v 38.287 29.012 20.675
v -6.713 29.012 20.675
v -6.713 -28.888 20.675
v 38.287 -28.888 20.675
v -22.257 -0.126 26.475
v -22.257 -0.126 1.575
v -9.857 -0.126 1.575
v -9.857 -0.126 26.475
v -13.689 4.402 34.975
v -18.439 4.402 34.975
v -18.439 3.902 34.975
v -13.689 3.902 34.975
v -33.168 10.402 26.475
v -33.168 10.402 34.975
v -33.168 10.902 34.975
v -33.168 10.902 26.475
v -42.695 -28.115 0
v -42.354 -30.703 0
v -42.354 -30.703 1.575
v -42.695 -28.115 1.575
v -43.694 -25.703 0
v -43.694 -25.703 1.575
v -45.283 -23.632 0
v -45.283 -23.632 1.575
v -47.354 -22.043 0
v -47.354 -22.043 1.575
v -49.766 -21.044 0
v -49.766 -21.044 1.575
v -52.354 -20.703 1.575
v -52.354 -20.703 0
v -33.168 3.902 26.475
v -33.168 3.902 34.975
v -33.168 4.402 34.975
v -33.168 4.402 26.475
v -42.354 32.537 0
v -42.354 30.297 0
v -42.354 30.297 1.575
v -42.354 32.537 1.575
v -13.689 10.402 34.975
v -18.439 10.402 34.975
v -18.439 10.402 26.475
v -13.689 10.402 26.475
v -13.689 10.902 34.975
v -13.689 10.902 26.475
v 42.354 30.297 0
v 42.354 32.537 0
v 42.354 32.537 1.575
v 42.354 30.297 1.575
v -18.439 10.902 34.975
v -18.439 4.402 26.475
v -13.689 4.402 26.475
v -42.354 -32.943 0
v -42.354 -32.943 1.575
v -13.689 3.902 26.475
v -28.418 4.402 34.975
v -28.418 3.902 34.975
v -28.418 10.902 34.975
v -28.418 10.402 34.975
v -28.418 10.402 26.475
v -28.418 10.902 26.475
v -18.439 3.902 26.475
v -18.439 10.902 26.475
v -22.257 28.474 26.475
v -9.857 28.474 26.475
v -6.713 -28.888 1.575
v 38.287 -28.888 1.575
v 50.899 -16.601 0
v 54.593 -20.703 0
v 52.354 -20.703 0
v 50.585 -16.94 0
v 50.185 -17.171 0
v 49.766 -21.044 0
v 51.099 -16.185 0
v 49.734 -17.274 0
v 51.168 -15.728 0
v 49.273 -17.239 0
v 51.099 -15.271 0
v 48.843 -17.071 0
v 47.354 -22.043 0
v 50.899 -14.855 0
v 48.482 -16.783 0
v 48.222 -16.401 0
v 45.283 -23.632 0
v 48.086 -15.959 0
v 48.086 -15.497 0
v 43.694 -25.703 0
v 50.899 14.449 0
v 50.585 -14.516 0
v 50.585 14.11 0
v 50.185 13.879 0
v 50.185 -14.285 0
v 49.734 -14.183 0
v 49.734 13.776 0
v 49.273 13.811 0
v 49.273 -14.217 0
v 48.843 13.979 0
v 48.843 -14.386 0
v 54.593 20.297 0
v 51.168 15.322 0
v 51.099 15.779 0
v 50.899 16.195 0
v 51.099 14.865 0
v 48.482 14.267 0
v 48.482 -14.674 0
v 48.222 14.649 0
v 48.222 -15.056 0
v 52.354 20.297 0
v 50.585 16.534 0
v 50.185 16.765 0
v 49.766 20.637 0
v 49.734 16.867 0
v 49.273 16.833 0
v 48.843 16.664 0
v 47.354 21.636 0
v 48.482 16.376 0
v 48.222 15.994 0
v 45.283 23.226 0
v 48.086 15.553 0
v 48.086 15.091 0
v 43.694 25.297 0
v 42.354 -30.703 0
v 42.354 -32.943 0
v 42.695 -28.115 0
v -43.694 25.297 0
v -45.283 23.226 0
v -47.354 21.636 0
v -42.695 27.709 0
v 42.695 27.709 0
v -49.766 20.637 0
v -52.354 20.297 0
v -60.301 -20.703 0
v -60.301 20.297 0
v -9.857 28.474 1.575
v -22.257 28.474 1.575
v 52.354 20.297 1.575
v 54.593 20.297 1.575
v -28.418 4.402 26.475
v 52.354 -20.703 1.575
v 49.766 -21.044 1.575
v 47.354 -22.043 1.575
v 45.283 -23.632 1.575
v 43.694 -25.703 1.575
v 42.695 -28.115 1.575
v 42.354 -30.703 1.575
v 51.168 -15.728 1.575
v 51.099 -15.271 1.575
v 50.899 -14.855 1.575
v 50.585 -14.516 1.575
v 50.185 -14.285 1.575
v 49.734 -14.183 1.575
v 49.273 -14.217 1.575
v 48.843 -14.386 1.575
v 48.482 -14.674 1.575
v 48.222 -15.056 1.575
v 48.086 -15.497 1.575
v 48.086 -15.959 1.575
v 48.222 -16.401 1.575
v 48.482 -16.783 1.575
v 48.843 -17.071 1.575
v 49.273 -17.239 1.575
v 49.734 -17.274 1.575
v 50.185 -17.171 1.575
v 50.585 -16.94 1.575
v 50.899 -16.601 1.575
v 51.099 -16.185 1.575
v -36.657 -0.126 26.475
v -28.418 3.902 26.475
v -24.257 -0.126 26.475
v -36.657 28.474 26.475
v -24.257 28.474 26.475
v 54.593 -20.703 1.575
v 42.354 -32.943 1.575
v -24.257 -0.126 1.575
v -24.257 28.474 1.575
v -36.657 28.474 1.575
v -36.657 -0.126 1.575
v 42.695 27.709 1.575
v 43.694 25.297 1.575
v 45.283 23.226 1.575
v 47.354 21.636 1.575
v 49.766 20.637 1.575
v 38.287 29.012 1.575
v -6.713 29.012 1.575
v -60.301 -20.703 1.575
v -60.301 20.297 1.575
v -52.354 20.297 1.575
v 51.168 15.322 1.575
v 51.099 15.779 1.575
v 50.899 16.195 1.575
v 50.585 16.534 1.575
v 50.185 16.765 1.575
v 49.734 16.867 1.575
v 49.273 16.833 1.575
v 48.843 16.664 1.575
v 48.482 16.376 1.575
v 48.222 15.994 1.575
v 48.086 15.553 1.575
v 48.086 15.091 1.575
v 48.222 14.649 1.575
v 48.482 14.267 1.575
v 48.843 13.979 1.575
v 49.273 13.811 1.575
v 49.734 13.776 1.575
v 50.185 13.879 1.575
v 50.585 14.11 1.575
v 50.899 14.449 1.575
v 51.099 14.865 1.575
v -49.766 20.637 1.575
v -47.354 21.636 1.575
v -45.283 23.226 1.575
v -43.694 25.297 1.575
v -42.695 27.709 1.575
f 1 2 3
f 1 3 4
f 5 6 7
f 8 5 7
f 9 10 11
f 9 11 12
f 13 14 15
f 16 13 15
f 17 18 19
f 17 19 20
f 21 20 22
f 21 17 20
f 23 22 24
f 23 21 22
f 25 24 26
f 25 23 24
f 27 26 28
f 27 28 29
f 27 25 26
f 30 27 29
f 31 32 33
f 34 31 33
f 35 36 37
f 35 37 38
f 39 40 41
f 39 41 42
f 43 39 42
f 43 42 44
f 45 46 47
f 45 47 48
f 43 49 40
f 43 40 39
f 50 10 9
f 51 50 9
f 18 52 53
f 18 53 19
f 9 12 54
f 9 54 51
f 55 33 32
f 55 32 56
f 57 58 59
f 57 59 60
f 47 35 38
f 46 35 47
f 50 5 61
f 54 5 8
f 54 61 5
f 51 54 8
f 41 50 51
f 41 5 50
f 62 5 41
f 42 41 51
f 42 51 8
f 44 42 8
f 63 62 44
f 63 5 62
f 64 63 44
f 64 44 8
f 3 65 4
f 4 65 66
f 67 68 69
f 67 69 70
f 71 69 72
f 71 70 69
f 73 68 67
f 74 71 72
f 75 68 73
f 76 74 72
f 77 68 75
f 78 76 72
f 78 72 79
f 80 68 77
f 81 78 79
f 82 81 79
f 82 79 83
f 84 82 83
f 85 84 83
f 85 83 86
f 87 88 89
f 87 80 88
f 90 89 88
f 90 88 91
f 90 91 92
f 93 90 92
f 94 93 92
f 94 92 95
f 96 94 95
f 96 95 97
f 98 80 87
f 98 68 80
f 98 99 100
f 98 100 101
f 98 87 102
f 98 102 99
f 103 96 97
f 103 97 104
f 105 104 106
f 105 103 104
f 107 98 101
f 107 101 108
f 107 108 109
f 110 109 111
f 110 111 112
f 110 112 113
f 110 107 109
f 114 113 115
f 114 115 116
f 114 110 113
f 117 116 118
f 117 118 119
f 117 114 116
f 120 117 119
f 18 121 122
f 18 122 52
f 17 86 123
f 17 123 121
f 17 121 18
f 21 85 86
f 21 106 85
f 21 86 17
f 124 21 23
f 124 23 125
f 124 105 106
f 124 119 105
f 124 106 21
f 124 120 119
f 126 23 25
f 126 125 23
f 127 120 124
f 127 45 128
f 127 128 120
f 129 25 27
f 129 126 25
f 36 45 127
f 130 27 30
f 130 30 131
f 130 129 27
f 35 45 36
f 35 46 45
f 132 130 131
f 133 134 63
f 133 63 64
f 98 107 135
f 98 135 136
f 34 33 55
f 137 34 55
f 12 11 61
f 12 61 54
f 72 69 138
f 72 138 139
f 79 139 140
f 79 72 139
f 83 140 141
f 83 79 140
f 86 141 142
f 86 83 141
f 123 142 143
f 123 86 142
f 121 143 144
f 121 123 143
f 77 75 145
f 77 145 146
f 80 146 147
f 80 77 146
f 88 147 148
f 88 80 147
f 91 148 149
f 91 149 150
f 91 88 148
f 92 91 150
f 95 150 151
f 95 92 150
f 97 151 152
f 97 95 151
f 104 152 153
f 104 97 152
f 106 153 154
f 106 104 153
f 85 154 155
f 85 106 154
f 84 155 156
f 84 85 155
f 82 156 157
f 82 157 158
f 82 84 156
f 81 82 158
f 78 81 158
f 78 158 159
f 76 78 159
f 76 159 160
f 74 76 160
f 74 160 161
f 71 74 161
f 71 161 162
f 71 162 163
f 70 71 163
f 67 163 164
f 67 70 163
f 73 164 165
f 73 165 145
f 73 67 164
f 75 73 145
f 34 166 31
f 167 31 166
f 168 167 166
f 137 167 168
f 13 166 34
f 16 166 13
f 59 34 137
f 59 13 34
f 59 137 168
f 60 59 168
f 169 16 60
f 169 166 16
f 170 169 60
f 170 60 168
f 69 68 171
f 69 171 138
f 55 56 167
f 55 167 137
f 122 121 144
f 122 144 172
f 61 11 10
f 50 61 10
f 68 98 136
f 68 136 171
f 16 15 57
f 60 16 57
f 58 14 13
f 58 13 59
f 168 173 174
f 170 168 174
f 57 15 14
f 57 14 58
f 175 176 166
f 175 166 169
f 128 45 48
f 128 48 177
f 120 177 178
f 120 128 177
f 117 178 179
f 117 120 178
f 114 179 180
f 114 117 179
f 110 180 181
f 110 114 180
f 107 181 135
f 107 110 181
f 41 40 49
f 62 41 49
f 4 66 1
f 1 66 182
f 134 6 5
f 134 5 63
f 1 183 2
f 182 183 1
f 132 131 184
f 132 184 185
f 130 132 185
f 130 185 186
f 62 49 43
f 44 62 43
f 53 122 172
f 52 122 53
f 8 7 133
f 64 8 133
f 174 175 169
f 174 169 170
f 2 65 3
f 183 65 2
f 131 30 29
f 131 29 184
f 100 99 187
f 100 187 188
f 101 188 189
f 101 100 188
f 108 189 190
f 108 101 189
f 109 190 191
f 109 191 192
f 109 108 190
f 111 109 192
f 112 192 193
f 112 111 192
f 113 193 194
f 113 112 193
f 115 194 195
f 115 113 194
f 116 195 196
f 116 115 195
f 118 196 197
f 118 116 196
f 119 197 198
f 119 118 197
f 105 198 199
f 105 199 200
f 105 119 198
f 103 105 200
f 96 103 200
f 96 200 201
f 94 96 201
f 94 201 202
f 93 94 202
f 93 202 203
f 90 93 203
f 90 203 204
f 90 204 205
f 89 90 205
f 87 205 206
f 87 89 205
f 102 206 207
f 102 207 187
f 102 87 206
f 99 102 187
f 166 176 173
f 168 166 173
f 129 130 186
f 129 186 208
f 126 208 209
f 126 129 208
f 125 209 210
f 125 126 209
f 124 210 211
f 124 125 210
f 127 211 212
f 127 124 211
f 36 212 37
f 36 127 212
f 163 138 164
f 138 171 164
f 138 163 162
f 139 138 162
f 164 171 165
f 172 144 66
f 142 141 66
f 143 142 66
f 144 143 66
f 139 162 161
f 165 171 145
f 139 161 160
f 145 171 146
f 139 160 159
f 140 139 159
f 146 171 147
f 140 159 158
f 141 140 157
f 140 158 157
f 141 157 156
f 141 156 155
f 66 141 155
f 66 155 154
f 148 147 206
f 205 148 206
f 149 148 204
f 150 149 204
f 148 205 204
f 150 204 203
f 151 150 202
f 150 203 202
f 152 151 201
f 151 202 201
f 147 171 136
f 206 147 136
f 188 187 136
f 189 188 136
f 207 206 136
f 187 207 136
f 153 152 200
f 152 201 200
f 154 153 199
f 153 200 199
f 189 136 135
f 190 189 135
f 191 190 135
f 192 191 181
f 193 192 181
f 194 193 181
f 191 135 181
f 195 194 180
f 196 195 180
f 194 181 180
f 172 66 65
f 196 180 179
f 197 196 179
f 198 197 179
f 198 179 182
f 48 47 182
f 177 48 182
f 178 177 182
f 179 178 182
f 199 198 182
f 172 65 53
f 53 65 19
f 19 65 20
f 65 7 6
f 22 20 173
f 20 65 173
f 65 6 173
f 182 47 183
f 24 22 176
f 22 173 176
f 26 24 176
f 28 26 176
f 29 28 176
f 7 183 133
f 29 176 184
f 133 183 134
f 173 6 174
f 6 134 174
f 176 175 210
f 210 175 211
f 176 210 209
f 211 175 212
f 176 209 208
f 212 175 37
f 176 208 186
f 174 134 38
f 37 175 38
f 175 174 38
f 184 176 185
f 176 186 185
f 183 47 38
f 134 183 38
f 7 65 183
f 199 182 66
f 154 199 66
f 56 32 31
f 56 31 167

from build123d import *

# Parameters (mm, degrees)
SKETCH1_R           = 1.55
BOSS_EXTRUDE1_DEPTH = 1.5748
SKETCH2_W           = 12.4
SKETCH2_H           = 28.6
BOSS_EXTRUDE2_DEPTH = 24.9
SKETCH3_W           = 4.75
SKETCH3_H           = 0.5
BOSS_EXTRUDE3_DEPTH = 8.5
SKETCH4_W           = 45
SKETCH4_H           = 57.9
BOSS_EXTRUDE4_DEPTH = 19.1


with BuildPart() as part:
    # Sketch1 → Boss-Extrude1 (new body)
    with BuildSketch(Plane.XY):
        with BuildLine():
            Line((42.354093023, -30.703264053), (42.354093023, -32.943264053))
            Line((42.354093023, -32.943264053), (-42.354093023, -32.943264053))
            Line((-42.354093023, -32.943264053), (-42.354093023, -30.703264053))
            ThreePointArc((-42.354093023, -30.703264053), (-45.283025211, -23.632196241), (-52.354093023, -20.703264053))
            Line((-52.354093023, -20.703264053), (-60.301272865, -20.703264053))
            Line((-60.301272865, -20.703264053), (-60.301272865, 20.296735947))
            Line((-60.301272865, 20.296735947), (-52.354093023, 20.296735947))
            ThreePointArc((-52.354093023, 20.296735947), (-45.283025211, 23.225668135), (-42.354093023, 30.296735947))
            Line((-42.354093023, 30.296735947), (-42.354093023, 32.536735947))
            Line((-42.354093023, 32.536735947), (42.354093023, 32.536735947))
            Line((42.354093023, 32.536735947), (42.354093023, 30.296735947))
            ThreePointArc((42.354093023, 30.296735947), (45.283025211, 23.225668135), (52.354093023, 20.296735947))
            Line((52.354093023, 20.296735947), (54.593335979, 20.296735947))
            Line((54.593335979, 20.296735947), (54.593335979, -20.703264053))
            Line((54.593335979, -20.703264053), (52.354093023, -20.703264053))
            ThreePointArc((52.354093023, -20.703264053), (45.283025211, -23.632196241), (42.354093023, -30.703264053))
        make_face()
        with Locations((49.618335979, -15.728264053)):
            Circle(SKETCH1_R, mode=Mode.SUBTRACT)
        with Locations((49.618335979, 15.321735947)):
            Circle(SKETCH1_R, mode=Mode.SUBTRACT)
    extrude(amount=BOSS_EXTRUDE1_DEPTH)

    # Sketch2 → Boss-Extrude2 (add)
    with BuildSketch(Plane.XY.offset(1.5748)):
        with Locations((-30.457181744, 14.174173465)):
            Rectangle(SKETCH2_W, SKETCH2_H)
        with Locations((-16.057181744, 14.174173465)):
            Rectangle(SKETCH2_W, SKETCH2_H)
    extrude(amount=BOSS_EXTRUDE2_DEPTH)

    # Sketch3 → Boss-Extrude3 (add)
    with BuildSketch(Plane.XY.offset(26.4748)):
        with Locations((-16.064182879, 4.152019918)):
            Rectangle(SKETCH3_W, SKETCH3_H)
        with Locations((-16.064182879, 10.652019918)):
            Rectangle(SKETCH3_W, SKETCH3_H)
        with Locations((-30.792693371, 4.152019918)):
            Rectangle(SKETCH3_W, SKETCH3_H)
        with Locations((-30.792693371, 10.652019918)):
            Rectangle(SKETCH3_W, SKETCH3_H)
    extrude(amount=BOSS_EXTRUDE3_DEPTH)

    # Sketch4 → Boss-Extrude4 (add)
    with BuildSketch(Plane.XY.offset(1.5748)):
        with Locations((15.786645431, 0.061567403)):
            Rectangle(SKETCH4_W, SKETCH4_H)
    extrude(amount=BOSS_EXTRUDE4_DEPTH)


solid = part.part
